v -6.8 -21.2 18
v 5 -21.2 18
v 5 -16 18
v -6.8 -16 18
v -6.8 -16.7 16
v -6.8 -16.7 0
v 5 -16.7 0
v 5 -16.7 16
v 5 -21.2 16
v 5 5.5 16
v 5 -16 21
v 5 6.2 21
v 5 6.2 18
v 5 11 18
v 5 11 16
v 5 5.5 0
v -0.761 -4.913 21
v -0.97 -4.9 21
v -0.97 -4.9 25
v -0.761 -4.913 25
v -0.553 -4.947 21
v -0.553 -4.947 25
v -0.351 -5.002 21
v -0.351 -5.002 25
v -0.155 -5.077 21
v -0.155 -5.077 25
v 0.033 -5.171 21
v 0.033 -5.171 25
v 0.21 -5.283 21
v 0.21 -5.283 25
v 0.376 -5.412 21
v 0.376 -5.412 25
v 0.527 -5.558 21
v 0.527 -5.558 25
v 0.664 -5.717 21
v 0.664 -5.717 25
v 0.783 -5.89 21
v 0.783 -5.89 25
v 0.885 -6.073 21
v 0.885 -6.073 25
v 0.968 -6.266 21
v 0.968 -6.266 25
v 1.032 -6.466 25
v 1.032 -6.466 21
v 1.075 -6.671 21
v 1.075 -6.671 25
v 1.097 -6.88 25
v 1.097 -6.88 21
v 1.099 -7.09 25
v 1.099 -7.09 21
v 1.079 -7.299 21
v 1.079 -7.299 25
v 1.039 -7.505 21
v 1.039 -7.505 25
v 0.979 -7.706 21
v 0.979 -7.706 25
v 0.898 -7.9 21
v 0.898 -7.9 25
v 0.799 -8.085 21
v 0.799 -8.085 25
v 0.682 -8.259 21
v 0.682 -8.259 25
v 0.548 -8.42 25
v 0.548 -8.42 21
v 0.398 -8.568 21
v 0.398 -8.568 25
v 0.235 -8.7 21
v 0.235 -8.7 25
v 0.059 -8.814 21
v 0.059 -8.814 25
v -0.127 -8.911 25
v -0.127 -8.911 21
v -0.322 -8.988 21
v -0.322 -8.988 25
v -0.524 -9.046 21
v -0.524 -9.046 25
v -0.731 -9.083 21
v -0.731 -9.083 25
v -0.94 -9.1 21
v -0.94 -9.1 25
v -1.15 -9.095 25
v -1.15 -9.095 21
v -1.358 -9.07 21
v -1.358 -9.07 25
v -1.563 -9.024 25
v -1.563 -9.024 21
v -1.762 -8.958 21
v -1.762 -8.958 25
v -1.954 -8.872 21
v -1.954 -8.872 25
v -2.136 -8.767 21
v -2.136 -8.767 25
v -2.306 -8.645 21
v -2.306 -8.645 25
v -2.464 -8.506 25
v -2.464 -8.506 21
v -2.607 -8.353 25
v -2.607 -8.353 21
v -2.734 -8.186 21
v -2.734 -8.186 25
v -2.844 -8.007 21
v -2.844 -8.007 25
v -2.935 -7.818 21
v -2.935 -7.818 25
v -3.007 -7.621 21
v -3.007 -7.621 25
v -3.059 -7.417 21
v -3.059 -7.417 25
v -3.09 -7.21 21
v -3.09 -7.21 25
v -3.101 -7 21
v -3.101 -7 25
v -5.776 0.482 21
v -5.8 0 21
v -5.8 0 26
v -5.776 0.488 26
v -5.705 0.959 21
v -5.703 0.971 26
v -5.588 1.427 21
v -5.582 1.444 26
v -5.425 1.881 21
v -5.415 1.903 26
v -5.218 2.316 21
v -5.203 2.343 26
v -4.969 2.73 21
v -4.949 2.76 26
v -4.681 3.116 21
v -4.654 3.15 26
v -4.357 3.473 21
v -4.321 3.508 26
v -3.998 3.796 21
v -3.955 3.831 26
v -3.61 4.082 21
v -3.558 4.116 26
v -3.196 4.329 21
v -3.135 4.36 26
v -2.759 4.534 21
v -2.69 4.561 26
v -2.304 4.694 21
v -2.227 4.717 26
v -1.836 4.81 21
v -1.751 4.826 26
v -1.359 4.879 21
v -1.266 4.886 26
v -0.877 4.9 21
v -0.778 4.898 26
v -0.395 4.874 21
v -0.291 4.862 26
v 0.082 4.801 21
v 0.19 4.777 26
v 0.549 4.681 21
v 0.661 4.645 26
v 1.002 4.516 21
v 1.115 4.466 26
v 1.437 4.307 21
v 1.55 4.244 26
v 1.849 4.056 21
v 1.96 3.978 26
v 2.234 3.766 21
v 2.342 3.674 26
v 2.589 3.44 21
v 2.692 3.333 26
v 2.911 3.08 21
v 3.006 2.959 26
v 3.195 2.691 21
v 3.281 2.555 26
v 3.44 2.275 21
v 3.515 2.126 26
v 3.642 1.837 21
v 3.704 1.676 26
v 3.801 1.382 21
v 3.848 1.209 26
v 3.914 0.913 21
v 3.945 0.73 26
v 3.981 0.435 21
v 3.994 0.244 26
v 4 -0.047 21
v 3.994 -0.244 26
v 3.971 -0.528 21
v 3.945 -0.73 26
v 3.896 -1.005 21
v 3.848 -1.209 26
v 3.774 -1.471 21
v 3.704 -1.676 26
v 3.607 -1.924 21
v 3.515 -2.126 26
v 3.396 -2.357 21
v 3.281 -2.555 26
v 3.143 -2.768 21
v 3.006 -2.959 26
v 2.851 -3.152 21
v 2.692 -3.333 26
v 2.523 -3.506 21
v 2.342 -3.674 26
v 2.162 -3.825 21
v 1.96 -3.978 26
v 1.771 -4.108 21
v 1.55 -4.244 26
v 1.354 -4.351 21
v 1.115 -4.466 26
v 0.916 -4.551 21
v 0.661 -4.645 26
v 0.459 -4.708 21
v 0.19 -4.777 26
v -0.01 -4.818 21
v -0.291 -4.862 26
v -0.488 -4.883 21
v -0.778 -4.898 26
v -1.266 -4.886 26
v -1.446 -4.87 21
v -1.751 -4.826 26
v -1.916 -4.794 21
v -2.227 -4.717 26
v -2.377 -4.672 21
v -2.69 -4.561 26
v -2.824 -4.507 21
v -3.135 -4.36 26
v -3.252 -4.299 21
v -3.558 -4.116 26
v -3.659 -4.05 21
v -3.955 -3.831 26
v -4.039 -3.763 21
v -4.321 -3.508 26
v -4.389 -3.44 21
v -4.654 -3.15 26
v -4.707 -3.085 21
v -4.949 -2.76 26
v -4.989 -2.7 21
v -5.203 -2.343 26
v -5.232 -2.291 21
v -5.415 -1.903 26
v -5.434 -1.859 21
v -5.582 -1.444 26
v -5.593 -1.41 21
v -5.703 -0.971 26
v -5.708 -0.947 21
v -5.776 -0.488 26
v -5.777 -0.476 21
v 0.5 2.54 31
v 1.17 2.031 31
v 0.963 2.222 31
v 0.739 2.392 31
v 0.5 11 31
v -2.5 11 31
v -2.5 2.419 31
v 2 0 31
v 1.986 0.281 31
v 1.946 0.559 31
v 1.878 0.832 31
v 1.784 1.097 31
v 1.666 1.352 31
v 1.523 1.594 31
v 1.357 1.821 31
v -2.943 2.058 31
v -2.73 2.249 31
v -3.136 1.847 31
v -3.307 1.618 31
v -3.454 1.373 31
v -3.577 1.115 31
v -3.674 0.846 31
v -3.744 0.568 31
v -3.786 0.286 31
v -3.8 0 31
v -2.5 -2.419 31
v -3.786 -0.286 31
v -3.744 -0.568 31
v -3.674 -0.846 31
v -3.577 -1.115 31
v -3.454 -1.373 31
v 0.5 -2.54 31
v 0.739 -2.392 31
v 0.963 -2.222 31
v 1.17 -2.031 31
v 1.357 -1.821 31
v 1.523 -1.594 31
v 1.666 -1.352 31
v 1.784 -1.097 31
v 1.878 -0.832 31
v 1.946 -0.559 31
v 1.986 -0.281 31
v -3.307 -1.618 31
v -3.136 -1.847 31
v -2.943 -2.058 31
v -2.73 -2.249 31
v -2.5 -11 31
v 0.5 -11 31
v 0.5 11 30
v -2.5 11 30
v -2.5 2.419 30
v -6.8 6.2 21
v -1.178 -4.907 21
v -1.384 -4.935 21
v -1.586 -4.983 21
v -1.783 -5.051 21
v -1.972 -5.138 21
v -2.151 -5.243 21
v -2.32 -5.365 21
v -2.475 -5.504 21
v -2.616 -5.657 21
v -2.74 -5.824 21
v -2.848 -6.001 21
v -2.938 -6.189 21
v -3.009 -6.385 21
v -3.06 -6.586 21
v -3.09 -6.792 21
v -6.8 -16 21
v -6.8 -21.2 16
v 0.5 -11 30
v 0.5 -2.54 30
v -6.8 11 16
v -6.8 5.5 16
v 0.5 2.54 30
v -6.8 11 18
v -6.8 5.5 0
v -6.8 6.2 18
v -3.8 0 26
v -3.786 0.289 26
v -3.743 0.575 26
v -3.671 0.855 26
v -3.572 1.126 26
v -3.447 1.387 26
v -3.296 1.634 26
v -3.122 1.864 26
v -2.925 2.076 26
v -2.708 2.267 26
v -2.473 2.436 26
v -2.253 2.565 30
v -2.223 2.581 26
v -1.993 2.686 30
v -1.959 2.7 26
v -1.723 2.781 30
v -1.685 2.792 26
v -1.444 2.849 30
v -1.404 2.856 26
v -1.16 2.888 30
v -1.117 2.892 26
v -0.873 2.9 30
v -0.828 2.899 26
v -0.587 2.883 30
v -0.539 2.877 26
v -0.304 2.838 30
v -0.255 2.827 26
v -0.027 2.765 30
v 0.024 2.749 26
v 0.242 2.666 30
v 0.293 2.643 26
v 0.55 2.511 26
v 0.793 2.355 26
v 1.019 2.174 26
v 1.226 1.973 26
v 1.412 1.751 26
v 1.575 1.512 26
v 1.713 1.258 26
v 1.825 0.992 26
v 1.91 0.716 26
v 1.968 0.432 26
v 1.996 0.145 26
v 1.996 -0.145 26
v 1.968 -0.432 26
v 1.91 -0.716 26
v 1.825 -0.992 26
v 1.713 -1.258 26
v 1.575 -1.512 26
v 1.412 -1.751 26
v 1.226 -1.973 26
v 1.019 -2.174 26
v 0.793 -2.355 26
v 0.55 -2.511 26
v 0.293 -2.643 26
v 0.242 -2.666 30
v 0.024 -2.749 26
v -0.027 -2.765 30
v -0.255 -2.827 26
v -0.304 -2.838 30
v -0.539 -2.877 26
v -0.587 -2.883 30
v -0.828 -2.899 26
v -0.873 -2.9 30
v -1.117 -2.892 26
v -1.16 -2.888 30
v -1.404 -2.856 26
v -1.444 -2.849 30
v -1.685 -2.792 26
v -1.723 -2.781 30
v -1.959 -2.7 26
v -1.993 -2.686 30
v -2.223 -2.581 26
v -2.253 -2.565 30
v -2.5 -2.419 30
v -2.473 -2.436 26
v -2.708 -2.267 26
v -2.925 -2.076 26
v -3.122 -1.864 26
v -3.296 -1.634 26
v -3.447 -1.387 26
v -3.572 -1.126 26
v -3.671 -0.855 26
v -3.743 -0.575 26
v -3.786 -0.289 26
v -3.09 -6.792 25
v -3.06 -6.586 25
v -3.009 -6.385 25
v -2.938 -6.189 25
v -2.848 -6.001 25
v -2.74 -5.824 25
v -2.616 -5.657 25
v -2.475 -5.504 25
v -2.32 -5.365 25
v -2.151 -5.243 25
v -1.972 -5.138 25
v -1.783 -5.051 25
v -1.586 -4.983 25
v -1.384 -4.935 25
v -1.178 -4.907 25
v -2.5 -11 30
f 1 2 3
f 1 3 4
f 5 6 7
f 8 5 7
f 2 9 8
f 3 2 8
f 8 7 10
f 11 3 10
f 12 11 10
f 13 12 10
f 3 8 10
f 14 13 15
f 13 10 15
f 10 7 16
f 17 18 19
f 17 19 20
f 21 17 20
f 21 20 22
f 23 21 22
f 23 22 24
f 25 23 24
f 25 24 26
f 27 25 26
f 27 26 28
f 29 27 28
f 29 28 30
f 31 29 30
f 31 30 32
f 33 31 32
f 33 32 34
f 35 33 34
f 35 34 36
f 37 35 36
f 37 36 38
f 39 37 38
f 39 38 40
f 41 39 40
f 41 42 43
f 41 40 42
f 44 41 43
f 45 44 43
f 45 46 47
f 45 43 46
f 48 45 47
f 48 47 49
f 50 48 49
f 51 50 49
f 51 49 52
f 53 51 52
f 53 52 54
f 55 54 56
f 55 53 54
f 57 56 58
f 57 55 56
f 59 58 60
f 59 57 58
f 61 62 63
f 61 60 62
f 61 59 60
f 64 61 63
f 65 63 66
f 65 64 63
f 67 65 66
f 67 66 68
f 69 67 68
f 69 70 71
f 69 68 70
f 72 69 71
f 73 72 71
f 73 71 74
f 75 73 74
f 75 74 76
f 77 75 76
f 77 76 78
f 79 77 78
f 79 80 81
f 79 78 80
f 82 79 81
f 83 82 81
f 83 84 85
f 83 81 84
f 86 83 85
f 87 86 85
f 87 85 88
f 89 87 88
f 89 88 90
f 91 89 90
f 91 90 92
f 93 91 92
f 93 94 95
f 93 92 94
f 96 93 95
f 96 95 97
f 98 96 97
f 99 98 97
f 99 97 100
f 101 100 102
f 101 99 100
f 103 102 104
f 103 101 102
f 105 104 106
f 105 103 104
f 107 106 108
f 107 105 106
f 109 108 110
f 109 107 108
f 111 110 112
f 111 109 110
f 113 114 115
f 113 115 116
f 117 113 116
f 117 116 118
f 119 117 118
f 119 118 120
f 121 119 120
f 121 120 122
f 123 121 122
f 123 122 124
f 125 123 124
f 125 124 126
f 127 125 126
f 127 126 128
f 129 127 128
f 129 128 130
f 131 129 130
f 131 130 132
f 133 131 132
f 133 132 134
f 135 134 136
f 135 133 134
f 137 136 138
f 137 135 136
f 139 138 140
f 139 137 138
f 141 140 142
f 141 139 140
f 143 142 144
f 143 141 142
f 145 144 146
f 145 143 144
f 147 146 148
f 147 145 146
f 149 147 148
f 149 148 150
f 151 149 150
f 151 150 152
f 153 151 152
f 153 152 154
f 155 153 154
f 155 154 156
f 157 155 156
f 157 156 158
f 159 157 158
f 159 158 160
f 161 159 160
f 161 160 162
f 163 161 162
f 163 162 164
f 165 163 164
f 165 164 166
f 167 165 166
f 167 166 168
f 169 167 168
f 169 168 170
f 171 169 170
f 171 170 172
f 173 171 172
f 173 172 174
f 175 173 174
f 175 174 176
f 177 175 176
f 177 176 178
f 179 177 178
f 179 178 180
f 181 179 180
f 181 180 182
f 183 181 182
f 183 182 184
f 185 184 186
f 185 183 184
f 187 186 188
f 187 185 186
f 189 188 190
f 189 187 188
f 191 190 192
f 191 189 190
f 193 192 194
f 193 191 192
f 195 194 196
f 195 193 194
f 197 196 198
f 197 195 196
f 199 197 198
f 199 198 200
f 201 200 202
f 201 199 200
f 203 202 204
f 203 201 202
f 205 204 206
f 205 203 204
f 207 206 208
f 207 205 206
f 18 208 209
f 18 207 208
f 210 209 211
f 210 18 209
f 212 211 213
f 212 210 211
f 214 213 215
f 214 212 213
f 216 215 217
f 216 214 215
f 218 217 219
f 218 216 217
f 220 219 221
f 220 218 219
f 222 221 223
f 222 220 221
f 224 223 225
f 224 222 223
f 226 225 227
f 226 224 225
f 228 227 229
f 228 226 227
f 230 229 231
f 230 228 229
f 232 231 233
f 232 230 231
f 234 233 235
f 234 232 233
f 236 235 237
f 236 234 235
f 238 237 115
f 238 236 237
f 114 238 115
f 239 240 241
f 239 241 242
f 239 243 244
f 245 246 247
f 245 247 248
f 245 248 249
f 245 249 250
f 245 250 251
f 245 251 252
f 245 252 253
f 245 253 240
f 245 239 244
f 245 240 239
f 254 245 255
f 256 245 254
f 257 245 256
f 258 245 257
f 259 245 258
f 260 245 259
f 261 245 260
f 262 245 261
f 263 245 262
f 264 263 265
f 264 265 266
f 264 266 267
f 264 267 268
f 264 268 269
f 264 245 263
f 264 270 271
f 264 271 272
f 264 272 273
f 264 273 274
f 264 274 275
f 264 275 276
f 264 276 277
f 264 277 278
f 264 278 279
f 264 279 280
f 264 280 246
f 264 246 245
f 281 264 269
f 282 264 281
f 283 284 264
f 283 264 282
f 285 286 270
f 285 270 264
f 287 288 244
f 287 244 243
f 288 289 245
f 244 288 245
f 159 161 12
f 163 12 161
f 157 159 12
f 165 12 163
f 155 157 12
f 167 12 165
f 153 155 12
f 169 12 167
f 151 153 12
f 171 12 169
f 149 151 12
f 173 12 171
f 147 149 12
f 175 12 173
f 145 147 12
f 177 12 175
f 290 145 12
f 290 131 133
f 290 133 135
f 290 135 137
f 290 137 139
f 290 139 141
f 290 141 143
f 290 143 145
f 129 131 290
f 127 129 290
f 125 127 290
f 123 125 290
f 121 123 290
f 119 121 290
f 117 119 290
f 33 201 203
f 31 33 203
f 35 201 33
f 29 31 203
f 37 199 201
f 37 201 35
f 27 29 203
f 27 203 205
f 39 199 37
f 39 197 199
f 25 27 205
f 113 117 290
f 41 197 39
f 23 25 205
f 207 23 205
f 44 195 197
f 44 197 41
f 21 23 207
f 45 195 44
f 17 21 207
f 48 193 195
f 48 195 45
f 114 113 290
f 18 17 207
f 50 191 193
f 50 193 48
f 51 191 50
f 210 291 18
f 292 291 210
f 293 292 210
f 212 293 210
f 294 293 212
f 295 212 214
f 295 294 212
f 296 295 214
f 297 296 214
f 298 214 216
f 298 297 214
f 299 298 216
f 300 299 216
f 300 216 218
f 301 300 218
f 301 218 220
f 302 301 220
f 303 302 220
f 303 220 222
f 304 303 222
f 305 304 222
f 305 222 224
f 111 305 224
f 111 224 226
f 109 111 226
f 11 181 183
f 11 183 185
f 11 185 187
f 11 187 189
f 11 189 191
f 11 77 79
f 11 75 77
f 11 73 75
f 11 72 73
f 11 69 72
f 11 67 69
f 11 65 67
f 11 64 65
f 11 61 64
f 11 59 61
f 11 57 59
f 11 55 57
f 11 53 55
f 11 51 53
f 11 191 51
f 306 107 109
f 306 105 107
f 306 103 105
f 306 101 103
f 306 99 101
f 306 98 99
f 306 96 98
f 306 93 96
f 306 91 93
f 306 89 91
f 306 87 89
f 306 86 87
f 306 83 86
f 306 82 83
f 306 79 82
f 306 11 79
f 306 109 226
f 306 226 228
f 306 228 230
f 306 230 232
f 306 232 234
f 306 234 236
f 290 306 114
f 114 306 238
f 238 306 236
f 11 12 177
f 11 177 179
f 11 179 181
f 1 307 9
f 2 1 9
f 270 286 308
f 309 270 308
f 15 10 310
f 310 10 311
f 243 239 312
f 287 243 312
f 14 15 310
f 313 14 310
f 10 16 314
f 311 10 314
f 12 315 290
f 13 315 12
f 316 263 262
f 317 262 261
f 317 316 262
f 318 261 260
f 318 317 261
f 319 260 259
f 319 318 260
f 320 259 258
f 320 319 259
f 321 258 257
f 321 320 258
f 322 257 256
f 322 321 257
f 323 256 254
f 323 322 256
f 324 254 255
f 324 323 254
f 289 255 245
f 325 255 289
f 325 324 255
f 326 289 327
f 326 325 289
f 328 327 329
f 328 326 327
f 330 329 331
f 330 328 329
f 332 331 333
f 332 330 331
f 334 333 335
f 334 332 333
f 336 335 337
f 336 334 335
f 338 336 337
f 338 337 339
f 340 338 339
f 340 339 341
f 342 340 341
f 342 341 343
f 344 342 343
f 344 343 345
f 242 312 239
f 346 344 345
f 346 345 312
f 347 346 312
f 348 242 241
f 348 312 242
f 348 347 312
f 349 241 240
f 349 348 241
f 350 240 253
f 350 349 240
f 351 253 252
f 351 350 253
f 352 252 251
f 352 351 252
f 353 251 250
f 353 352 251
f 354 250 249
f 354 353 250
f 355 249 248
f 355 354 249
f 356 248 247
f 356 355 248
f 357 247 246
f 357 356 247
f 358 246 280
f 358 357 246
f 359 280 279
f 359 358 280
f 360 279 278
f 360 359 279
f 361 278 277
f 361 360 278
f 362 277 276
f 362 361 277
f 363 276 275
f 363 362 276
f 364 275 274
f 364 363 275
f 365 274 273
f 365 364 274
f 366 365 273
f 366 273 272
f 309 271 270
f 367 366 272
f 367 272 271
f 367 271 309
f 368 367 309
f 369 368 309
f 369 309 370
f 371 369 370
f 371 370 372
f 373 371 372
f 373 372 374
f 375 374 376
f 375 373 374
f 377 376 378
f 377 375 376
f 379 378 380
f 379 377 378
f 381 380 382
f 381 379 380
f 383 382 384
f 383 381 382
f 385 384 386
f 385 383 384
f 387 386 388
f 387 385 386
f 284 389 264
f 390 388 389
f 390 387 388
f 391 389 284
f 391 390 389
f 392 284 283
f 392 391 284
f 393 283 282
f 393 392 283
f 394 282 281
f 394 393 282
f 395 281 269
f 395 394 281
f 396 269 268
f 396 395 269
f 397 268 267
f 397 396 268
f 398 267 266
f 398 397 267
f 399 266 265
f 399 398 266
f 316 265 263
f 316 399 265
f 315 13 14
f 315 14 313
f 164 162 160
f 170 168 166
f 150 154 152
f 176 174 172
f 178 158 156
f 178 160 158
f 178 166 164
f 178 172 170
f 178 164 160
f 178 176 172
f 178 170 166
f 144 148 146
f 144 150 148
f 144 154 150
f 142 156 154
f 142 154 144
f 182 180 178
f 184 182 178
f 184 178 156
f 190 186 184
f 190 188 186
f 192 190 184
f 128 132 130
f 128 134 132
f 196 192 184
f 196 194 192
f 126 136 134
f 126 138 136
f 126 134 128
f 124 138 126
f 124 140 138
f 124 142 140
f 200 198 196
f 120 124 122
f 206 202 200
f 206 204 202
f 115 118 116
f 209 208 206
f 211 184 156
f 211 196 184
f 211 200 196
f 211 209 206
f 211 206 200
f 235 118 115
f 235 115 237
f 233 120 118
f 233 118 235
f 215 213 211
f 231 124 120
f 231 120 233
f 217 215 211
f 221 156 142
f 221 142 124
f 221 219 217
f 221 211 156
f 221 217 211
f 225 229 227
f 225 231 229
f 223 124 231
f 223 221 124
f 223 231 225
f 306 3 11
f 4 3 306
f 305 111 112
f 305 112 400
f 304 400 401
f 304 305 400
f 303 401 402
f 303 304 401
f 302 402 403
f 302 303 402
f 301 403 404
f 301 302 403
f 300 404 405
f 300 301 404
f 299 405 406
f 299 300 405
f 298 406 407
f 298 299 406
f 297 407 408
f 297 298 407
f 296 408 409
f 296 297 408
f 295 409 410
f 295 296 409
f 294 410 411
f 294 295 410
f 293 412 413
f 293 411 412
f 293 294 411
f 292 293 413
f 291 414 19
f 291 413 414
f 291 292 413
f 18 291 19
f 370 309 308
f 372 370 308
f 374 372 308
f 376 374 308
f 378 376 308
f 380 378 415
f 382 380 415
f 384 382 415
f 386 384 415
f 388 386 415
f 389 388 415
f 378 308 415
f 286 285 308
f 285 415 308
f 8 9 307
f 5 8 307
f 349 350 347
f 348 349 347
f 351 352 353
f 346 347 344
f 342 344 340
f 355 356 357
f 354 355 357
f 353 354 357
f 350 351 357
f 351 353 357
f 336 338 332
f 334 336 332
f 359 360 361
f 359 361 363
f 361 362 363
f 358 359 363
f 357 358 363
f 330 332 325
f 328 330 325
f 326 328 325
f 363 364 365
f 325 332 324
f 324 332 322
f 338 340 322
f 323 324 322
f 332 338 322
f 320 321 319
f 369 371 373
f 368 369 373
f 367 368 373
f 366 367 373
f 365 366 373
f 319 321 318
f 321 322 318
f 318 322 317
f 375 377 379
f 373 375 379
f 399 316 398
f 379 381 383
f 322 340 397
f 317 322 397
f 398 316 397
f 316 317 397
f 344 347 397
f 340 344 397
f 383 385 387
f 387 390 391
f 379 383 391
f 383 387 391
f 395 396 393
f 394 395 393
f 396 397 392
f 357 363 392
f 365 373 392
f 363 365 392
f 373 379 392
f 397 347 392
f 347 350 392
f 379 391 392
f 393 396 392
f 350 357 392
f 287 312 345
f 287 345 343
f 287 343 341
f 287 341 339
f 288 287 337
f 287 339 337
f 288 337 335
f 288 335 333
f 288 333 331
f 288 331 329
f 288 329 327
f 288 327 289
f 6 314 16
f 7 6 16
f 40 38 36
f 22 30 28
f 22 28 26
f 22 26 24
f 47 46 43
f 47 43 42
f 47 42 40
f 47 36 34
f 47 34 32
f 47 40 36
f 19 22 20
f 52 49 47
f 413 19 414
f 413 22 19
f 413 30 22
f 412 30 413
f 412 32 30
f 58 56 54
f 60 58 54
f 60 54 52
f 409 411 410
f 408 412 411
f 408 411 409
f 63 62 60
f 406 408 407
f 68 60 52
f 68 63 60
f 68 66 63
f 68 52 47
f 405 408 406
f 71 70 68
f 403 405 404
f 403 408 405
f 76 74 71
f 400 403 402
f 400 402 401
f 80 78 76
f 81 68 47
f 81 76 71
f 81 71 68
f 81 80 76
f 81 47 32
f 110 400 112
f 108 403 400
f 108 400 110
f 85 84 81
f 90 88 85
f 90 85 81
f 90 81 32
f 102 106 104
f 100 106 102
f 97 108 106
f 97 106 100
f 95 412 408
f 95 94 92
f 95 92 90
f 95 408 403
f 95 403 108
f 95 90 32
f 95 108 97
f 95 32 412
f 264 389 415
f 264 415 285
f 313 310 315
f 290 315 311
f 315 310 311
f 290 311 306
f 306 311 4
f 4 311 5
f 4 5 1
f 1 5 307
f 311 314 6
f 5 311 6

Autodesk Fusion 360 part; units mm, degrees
sketch "Szkic1" plane through (0, 0, 0) normal (0, 0, 1) x (1, 0, 0)
  line L0 (5, 5.5) -> (-6.8, 5.5)
  line L1 (-6.8, 5.5) -> (-6.8, -16.7)
  line L2 (-6.8, -16.7) -> (5, -16.7)
  line L3 (5, -16.7) -> (5, 5.5)
  dimension "d5" = 11.8
  dimension "d6" = 22.2
extrude "Wyciągnięcie proste1" add sketch "Szkic1" along normal blind 16 makes body 1
sketch "Szkic2" plane through (0, 0, 16) normal (0, 0, 1) x (-1, 0, 0)
  line L0 (-5, 16.7) -> (-5, -5.5)
  line L1 (-5, -5.5) -> (6.8, -5.5)
  line L2 (6.8, -5.5) -> (6.8, 16.7)
  line L3 (6.8, 16.7) -> (-5, 16.7)
  line L4 (-5, -11) -> (6.8, -11)
  line L5 (6.8, -11) -> (6.8, 21.2)
  line L6 (6.8, 21.2) -> (-5, 21.2)
  line L7 (-5, 21.2) -> (-5, -11)
  dimension "d9" = 11.8
  dimension "d10" = 32.2
extrude "Wyciągnięcie proste2" add sketch "Szkic2" along normal blind 2 bodies 1
sketch "Szkic3" plane through (0, 0, 18) normal (0, 0, 1) x (-1, 0, 0)
  line L0 (-5, 21.2) -> (-5, -11)
  line L1 (-5, -11) -> (6.8, -11)
  line L2 (6.8, -11) -> (6.8, 21.2)
  line L3 (6.8, 21.2) -> (-5, 21.2)
  line L4 (-5, 16) -> (6.8, 16)
  line L5 (6.8, 16) -> (6.8, -6.2)
  line L6 (6.8, -6.2) -> (-5, -6.2)
  line L7 (-5, -6.2) -> (-5, 16)
  dimension "d13" = 11.8
  dimension "d14" = 22.2
extrude "Wyciągnięcie proste3" add sketch "Szkic3" along normal blind 3 contours L0 L2 L4 L5 L6 L7 bodies 1
sketch "Szkic4" plane through (0, 0, 21) normal (0, 0, 1) x (-1, 0, 0)
  line L0 (-5, -6.2) -> (6.8, -6.2)
  line L1 (6.8, -6.2) -> (6.8, 16)
  line L2 (6.8, 16) -> (-5, 16)
  line L3 (-5, 16) -> (-5, -6.2)
  circle A0 centre (0.9, 0) radius 4.9
  circle A1 centre (1, 7) radius 2.1007
extrude "Wyciągnięcie proste4" add sketch "Szkic4" along normal blind 5 contours A0 bodies 1
extrude "Wyciągnięcie proste5" add sketch "Szkic4" along normal blind 4 contours A1 bodies 1
sketch "Szkic5" plane through (0, 0, 26) normal (0, 0, 1) x (-1, 0, 0)
  circle A0 centre (0.9, 0) radius 4.9
  circle A1 centre (0.9, 0) radius 2.9
extrude "Wyciągnięcie proste6" add sketch "Szkic5" along normal blind 5 separate body contours A1 makes body 2
sketch "Szkic6" plane through (0, 0, 0) normal (0, 1, 0) x (1, 0, 0)
  line L0 (-2.5, -31) -> (0.5, -31)
  line L1 (0.5, -31) -> (0.5, -30)
  line L2 (0.5, -30) -> (-2.5, -30)
  line L3 (-2.5, -30) -> (-2.5, -31)
  line L4 (-2.5, -31) -> (0.5, -30) construction
  line L5 (0.5, -31) -> (-2.5, -30) construction
  point P0 (-1, -30.5)
extrude "Wyciągnięcie proste7" add sketch "Szkic6" along normal blind 11 and the other way blind 11 bodies 2
